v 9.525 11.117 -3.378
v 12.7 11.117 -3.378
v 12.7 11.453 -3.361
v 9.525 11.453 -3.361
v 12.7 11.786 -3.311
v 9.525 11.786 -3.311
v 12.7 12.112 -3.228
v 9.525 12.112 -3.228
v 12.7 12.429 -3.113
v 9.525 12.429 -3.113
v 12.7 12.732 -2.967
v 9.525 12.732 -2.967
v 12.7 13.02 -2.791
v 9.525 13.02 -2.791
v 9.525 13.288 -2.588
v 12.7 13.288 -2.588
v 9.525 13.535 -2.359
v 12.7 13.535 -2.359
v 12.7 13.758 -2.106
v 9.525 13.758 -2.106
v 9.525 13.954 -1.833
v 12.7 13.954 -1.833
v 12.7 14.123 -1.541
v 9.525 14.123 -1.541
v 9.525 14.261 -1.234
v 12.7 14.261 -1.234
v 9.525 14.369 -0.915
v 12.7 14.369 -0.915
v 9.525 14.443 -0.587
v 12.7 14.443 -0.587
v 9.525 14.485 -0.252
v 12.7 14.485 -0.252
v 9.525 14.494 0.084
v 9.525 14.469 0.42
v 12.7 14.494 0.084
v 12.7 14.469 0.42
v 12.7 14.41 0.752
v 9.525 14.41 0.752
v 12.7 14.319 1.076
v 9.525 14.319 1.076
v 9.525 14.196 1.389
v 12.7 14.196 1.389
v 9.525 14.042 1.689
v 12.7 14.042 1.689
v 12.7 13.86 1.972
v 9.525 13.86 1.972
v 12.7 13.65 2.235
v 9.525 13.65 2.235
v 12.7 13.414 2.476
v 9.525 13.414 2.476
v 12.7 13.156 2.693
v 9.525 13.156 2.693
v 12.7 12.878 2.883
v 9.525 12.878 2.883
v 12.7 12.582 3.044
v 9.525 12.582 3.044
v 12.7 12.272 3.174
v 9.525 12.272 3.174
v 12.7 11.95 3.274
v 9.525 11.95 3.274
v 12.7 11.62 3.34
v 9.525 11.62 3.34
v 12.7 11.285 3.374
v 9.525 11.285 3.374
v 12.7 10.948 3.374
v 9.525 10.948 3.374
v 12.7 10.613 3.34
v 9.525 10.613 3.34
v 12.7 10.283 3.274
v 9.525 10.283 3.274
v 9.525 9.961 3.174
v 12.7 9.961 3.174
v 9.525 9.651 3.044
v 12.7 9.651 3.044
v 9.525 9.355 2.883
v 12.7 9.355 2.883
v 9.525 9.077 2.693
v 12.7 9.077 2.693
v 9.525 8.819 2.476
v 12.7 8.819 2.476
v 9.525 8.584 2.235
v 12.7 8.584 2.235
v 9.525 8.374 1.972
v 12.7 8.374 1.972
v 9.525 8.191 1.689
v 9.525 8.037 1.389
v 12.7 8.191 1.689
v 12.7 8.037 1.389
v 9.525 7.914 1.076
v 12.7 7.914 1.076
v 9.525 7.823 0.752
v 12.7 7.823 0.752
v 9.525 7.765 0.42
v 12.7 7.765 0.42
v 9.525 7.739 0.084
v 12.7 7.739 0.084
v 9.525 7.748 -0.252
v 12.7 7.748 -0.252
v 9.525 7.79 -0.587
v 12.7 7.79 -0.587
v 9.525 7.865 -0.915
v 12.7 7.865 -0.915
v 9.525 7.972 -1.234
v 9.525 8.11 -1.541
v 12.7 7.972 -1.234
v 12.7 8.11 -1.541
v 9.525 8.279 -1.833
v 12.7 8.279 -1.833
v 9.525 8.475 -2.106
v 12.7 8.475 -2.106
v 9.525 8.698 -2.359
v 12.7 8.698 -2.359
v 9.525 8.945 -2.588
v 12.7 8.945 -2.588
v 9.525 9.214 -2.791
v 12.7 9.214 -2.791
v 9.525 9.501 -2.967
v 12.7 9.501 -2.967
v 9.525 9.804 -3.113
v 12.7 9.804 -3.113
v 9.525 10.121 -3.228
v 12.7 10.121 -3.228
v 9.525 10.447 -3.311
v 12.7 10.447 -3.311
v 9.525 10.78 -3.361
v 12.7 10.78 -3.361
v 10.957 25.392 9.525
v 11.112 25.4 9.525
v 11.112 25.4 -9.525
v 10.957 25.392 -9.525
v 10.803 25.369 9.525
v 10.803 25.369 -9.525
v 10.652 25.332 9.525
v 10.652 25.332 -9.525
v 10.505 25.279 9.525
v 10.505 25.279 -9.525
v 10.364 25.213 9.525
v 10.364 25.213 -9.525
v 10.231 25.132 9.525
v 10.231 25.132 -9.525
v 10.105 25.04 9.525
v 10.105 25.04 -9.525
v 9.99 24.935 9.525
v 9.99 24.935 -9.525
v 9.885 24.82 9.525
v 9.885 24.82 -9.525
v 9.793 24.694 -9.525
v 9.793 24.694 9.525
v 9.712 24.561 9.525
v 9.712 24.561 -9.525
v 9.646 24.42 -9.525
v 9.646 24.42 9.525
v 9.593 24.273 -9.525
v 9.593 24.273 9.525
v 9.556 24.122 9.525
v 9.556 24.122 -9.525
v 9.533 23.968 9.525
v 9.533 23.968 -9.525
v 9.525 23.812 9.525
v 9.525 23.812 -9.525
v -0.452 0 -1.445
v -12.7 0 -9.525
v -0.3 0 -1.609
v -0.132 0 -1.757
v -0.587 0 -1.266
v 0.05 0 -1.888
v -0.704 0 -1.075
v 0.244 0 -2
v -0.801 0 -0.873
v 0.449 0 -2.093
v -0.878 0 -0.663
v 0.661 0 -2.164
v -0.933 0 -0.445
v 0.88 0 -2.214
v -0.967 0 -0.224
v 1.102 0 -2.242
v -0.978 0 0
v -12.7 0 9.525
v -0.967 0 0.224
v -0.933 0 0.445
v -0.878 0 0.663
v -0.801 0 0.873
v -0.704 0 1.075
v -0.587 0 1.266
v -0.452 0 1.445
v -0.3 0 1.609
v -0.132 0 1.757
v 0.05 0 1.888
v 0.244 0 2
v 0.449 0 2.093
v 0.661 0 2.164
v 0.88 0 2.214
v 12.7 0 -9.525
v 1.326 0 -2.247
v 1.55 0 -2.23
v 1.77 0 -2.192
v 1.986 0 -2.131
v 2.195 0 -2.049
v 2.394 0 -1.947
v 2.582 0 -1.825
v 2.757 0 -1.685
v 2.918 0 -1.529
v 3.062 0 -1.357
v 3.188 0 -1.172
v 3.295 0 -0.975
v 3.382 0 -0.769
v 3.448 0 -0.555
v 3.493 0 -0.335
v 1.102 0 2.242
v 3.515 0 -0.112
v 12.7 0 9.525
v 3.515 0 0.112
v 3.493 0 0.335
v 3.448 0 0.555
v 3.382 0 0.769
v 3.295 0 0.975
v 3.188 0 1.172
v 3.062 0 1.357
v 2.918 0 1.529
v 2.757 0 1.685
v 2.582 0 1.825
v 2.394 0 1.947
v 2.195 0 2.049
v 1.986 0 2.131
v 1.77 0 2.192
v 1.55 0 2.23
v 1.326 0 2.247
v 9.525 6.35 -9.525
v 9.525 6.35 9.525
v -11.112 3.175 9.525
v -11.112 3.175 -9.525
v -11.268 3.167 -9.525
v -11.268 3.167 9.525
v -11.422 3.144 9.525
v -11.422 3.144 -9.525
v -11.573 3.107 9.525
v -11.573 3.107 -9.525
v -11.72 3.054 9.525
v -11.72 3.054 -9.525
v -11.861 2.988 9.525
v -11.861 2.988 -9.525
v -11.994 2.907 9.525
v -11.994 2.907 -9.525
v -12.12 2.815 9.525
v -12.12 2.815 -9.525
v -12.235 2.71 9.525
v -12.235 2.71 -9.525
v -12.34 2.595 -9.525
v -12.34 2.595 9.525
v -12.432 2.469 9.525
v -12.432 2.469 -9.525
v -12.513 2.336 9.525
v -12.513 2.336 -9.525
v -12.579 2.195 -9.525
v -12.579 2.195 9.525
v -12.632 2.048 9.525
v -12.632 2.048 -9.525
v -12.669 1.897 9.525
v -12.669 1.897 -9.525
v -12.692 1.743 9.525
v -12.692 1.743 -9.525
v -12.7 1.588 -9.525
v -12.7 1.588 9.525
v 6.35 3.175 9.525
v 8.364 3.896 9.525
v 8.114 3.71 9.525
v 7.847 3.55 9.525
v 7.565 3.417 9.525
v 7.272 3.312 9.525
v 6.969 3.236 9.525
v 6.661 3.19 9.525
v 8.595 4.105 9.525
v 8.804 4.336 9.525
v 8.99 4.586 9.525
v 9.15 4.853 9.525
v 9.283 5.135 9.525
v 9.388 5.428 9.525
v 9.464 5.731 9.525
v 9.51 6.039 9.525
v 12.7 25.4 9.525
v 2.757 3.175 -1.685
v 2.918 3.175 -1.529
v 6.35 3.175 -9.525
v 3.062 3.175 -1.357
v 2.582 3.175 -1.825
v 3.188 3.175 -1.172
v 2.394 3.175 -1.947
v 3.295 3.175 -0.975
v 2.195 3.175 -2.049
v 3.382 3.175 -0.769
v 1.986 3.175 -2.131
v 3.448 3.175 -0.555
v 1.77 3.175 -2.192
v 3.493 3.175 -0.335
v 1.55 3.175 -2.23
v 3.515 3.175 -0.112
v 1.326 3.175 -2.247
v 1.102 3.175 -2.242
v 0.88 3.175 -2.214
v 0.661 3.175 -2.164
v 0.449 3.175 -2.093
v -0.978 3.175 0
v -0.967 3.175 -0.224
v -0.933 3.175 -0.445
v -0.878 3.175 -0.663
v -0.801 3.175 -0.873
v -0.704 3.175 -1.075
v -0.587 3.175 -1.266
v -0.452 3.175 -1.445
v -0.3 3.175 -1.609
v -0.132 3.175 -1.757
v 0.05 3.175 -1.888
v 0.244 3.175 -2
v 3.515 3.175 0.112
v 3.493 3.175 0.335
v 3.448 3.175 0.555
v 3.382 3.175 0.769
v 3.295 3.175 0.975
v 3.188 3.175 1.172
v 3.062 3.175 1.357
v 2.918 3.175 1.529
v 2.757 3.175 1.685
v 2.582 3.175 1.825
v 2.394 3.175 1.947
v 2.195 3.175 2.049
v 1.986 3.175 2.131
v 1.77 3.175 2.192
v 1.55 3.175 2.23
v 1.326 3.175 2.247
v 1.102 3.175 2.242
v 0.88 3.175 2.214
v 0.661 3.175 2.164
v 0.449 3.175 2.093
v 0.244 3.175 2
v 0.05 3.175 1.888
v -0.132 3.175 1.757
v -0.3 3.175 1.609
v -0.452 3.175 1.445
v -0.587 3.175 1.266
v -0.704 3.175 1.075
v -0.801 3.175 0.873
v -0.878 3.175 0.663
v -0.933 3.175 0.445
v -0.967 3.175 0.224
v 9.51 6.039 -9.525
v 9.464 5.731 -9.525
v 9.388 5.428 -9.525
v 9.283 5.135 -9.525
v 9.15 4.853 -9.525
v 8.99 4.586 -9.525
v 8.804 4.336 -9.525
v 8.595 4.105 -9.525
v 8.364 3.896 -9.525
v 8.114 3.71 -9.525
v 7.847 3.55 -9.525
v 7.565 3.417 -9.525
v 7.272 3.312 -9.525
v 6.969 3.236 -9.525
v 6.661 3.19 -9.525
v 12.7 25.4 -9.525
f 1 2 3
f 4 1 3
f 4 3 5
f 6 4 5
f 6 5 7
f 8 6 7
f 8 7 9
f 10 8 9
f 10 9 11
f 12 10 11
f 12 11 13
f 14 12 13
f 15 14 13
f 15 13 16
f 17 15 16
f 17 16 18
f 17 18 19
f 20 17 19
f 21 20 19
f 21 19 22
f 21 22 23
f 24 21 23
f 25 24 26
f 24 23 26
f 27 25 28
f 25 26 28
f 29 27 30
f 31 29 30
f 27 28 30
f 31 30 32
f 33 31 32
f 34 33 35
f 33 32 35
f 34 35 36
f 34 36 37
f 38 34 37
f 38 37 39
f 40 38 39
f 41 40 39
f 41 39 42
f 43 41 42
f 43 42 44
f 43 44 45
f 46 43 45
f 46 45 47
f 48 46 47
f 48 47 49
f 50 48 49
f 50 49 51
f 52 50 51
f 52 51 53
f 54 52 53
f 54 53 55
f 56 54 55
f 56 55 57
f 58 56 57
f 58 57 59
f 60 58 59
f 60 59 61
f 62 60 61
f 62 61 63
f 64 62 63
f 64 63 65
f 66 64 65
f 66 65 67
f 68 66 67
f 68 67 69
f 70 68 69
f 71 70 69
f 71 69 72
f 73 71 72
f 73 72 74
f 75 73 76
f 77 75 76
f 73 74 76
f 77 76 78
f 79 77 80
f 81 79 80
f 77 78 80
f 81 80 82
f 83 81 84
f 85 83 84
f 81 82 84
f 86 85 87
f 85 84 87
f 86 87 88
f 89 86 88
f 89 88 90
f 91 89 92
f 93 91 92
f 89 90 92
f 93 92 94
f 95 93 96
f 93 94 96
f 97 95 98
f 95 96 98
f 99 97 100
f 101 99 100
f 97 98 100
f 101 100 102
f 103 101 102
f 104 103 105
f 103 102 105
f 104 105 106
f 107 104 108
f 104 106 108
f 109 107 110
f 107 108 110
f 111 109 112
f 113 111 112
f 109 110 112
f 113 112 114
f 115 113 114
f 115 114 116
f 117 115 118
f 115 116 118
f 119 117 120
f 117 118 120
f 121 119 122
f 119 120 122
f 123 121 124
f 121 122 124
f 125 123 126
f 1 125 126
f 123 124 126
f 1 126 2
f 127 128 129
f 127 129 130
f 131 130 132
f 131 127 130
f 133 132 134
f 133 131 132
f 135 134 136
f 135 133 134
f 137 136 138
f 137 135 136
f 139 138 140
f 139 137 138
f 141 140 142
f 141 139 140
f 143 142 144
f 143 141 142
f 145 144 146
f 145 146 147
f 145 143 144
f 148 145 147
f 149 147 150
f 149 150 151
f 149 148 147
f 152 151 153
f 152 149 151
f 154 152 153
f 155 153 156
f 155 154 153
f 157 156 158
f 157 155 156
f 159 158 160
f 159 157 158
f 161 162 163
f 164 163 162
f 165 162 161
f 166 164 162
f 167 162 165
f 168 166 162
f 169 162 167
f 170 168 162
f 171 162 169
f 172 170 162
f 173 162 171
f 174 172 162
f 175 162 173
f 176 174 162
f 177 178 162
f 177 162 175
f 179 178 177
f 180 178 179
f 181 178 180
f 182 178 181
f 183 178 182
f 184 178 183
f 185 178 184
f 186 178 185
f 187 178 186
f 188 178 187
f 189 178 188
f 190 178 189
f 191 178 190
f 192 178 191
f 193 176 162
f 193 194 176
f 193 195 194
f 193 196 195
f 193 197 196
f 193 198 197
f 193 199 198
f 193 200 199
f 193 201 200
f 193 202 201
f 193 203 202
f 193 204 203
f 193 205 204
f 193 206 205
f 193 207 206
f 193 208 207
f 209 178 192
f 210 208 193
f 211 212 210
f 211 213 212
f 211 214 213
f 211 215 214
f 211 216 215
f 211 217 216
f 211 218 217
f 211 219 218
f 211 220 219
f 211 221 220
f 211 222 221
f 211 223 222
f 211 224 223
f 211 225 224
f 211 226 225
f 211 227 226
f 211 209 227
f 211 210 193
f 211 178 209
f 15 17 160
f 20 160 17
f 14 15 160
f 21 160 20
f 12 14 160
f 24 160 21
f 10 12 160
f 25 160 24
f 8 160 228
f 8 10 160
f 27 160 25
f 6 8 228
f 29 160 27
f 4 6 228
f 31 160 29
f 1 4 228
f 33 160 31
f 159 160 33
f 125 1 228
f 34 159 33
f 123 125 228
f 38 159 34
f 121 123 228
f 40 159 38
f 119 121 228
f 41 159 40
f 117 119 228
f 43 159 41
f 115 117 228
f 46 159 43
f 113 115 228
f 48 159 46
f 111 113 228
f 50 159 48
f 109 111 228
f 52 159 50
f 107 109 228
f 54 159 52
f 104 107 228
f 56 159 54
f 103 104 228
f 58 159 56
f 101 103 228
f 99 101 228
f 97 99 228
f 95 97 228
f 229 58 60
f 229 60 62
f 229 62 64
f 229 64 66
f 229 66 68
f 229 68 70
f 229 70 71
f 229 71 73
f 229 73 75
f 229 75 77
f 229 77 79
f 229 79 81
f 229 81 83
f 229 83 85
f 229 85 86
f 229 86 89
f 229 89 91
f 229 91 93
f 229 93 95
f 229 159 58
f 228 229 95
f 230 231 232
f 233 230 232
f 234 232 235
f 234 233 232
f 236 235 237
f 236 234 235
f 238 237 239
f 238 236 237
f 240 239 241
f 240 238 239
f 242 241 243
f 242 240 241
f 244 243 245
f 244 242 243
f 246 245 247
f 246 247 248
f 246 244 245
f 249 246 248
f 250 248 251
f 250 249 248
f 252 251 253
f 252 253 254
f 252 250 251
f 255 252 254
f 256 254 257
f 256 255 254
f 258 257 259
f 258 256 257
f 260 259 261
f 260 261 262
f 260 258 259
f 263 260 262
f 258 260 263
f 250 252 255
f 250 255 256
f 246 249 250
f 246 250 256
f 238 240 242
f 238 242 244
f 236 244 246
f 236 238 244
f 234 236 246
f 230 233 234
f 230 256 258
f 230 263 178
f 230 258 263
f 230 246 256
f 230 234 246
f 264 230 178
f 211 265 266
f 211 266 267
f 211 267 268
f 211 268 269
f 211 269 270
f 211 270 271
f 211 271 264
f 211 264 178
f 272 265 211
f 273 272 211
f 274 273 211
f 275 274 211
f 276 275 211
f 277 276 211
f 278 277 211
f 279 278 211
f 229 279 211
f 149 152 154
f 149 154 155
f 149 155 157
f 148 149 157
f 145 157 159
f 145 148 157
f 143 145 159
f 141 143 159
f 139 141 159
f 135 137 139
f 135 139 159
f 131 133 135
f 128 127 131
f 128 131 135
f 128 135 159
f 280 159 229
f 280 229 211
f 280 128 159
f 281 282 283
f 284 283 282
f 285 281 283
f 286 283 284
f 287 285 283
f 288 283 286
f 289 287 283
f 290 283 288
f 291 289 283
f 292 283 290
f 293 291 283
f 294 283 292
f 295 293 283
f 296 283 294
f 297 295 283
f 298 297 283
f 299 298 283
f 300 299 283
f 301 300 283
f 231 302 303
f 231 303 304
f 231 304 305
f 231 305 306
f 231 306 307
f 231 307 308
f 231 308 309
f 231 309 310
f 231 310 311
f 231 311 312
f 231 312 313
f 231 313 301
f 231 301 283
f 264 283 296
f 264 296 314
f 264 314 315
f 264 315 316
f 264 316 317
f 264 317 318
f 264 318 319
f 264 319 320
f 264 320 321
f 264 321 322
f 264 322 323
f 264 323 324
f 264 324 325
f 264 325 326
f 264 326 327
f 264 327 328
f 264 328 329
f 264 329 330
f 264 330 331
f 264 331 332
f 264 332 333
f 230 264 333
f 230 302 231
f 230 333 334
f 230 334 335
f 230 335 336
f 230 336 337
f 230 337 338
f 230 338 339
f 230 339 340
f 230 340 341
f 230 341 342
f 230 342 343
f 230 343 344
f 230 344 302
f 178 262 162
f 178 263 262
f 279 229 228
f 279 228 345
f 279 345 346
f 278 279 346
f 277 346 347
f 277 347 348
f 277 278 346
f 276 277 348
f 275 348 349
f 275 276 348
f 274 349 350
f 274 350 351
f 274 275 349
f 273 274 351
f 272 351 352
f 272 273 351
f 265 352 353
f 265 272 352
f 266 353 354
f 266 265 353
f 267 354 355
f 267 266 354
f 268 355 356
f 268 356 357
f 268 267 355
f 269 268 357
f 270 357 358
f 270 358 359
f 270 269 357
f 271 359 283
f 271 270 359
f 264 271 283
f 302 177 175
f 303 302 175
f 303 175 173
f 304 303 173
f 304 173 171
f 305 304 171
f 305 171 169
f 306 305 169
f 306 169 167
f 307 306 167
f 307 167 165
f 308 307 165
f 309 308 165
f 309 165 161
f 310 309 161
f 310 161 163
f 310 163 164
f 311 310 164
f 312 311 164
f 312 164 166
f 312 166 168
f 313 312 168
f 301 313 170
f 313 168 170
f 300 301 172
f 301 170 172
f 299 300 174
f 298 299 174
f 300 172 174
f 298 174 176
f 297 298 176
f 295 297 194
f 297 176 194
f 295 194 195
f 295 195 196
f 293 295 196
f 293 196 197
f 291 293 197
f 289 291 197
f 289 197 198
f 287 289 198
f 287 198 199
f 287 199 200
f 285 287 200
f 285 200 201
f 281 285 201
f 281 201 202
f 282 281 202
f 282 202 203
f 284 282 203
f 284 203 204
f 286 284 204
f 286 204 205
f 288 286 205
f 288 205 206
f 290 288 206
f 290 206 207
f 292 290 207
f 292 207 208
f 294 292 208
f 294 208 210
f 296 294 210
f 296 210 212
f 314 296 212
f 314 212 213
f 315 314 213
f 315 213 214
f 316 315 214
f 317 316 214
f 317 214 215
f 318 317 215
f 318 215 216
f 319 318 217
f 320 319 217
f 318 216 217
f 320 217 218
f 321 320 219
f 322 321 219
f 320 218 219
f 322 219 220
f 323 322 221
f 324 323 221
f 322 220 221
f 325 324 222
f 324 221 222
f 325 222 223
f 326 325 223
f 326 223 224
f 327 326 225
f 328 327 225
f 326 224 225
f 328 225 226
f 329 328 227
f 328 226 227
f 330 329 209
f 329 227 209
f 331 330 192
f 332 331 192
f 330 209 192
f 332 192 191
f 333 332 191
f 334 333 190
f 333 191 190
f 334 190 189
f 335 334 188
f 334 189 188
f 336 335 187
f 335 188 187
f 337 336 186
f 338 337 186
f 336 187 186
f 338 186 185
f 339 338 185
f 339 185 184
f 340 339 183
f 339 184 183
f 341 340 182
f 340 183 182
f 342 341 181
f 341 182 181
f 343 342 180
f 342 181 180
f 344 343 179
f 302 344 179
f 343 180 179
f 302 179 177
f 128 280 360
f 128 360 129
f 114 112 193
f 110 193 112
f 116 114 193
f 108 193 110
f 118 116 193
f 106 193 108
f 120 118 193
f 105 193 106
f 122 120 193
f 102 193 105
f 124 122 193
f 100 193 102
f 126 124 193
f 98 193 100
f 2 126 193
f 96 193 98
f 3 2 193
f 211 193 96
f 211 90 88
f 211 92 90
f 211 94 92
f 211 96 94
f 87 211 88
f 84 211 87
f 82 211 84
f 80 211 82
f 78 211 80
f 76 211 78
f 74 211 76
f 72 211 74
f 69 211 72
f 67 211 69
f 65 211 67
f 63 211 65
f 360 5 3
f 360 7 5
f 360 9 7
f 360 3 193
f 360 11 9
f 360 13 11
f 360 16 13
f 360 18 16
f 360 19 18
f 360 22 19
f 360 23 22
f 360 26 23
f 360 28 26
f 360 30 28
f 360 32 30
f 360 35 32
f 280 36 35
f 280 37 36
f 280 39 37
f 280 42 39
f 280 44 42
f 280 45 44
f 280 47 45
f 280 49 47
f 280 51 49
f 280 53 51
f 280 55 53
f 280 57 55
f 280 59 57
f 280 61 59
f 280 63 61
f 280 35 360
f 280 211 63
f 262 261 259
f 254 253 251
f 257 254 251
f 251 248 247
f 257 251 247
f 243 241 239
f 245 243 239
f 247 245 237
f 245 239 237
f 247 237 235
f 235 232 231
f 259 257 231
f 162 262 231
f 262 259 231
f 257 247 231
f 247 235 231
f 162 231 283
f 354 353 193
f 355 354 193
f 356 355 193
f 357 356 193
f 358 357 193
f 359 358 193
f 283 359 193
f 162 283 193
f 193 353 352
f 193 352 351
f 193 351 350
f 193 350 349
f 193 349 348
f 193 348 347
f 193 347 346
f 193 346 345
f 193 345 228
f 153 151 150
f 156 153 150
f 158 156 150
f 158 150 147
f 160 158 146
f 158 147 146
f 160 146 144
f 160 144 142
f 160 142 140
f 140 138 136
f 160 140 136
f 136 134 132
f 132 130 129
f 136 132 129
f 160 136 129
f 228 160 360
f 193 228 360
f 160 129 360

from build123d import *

# Parameters (mm, degrees)
BOSS_EXTRUDE1_DEPTH     = 9.525
F_1_4_CLEARANCE_HOLE1_D = 6.7564
F_8_CLEARANCE_HOLE1_D   = 4.4958


with BuildPart() as part:
    # Sketch2 → Boss-Extrude1 (new, symmetric)
    with BuildSketch(Plane.XY):
        with BuildLine():
            Line((-12.7, 0), (12.7, 0))
            Line((12.7, 0), (12.7, 25.4))
            Line((12.7, 25.4), (11.1125, 25.4))
            ThreePointArc((11.1125, 25.4), (9.989967985, 24.935032015), (9.525, 23.8125))
            Line((9.525, 23.8125), (9.525, 6.35))
            ThreePointArc((9.525, 6.35), (8.59506403, 4.10493597), (6.35, 3.175))
            Line((6.35, 3.175), (-11.1125, 3.175))
            ThreePointArc((-11.1125, 3.175), (-12.235032015, 2.710032015), (-12.7, 1.5875))
            Line((-12.7, 1.5875), (-12.7, 0))
        make_face()
    extrude(amount=BOSS_EXTRUDE1_DEPTH, both=True)

    # 1/4 Clearance Hole1 (through all)
    with Locations(Plane.ZY.offset(-9.525)):
        with Locations((0, 11.1166148)):
            Hole(F_1_4_CLEARANCE_HOLE1_D / 2)

    # #8 Clearance Hole1 (through all)
    with Locations(Plane(origin=(0, 3.175, 0), x_dir=(1, 0, 0), z_dir=(0, 1, 0))):
        with Locations((1.27, 0)):
            Hole(F_8_CLEARANCE_HOLE1_D / 2)


solid = part.part
